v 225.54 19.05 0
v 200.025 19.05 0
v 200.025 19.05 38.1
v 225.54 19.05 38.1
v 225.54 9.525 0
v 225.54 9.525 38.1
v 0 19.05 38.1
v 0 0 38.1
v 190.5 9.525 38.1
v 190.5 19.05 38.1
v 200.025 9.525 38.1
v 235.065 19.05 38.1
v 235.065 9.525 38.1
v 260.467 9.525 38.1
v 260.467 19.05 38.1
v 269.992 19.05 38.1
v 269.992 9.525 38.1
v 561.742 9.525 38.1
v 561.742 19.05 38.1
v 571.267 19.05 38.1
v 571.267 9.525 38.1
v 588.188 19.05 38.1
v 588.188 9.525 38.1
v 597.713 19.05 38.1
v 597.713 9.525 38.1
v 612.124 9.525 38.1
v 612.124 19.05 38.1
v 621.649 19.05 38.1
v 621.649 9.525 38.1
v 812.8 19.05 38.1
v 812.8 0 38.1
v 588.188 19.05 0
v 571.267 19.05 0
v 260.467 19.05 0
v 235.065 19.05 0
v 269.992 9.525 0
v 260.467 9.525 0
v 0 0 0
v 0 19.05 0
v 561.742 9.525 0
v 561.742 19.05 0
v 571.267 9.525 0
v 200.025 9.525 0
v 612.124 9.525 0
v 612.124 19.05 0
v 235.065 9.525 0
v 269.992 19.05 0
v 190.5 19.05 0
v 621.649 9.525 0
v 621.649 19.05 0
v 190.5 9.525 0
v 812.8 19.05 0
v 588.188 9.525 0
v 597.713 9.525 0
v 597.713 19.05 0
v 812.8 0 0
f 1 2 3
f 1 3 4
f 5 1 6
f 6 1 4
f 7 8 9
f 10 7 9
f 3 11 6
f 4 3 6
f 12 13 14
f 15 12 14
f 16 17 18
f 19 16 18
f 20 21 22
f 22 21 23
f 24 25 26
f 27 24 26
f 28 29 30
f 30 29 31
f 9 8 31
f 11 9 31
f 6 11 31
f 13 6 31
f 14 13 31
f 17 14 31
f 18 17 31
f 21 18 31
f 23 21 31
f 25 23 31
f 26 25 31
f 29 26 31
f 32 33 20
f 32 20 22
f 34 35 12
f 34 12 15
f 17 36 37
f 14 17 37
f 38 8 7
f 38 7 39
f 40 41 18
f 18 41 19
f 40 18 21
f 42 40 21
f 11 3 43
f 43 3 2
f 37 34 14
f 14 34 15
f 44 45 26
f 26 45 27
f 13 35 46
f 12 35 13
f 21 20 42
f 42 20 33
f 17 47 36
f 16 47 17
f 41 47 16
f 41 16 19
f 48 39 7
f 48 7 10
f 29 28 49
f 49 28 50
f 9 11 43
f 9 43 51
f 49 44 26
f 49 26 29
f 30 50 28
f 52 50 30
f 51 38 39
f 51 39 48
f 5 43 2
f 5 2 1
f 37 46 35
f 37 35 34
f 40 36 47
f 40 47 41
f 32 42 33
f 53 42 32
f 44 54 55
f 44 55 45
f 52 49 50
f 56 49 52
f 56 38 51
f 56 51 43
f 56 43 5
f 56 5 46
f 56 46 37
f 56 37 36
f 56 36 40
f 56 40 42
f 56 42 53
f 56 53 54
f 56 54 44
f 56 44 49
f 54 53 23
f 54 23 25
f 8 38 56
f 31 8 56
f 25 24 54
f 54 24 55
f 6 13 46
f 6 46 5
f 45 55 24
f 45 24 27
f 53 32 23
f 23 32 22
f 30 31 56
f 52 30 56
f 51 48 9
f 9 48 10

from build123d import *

# Parameters (mm, degrees)
SKETCH1_W           = 812.8
SKETCH1_H           = 38.1
BOSS_EXTRUDE1_DEPTH = 19.05
CUT_EXTRUDE3_DEPTH  = 9.525


with BuildPart() as part:
    # Sketch1 → Boss-Extrude1 (new body)
    with BuildSketch(Plane(origin=(0, 0, 0), x_dir=(1, 0, 0), z_dir=(0, 1, 0))):
        with Locations((406.4, -19.05)):
            Rectangle(SKETCH1_W, SKETCH1_H)
    extrude(amount=BOSS_EXTRUDE1_DEPTH)

    # Sketch2 → Cut-Extrude3 (cut)
    with BuildSketch(Plane(origin=(0, 19.05, 0), x_dir=(1, 0, 0), z_dir=(0, 1, 0))):
        Polygon((621.649258871, -19.05), (621.649258871, 0), (612.124258871, 0), (612.124258871, -19.05), (612.124258871, -38.1), (621.649258871, -38.1), align=None)
        Polygon((597.71307456, -19.05), (597.71307456, 0), (588.18807456, 0), (588.18807456, -19.05), (588.18807456, -38.1), (597.71307456, -38.1), align=None)
        Polygon((571.26745157, -19.05), (571.26745157, 0), (561.74245157, 0), (561.74245157, -19.05), (561.74245157, -38.1), (571.26745157, -38.1), align=None)
        Polygon((190.5, -19.05), (190.5, 0), (200.025, 0), (200.025, -19.05), (200.025, -38.1), (190.5, -38.1), align=None)
        Polygon((225.5404624, -19.05), (225.5404624, 0), (235.0654624, 0), (235.0654624, -38.1), (225.5404624, -38.1), align=None)
        Polygon((260.466704479, -19.05), (260.466704479, 0), (269.991704479, 0), (269.991704479, -38.1), (260.466704479, -38.1), align=None)
    extrude(amount=-CUT_EXTRUDE3_DEPTH, mode=Mode.SUBTRACT)


solid = part.part
